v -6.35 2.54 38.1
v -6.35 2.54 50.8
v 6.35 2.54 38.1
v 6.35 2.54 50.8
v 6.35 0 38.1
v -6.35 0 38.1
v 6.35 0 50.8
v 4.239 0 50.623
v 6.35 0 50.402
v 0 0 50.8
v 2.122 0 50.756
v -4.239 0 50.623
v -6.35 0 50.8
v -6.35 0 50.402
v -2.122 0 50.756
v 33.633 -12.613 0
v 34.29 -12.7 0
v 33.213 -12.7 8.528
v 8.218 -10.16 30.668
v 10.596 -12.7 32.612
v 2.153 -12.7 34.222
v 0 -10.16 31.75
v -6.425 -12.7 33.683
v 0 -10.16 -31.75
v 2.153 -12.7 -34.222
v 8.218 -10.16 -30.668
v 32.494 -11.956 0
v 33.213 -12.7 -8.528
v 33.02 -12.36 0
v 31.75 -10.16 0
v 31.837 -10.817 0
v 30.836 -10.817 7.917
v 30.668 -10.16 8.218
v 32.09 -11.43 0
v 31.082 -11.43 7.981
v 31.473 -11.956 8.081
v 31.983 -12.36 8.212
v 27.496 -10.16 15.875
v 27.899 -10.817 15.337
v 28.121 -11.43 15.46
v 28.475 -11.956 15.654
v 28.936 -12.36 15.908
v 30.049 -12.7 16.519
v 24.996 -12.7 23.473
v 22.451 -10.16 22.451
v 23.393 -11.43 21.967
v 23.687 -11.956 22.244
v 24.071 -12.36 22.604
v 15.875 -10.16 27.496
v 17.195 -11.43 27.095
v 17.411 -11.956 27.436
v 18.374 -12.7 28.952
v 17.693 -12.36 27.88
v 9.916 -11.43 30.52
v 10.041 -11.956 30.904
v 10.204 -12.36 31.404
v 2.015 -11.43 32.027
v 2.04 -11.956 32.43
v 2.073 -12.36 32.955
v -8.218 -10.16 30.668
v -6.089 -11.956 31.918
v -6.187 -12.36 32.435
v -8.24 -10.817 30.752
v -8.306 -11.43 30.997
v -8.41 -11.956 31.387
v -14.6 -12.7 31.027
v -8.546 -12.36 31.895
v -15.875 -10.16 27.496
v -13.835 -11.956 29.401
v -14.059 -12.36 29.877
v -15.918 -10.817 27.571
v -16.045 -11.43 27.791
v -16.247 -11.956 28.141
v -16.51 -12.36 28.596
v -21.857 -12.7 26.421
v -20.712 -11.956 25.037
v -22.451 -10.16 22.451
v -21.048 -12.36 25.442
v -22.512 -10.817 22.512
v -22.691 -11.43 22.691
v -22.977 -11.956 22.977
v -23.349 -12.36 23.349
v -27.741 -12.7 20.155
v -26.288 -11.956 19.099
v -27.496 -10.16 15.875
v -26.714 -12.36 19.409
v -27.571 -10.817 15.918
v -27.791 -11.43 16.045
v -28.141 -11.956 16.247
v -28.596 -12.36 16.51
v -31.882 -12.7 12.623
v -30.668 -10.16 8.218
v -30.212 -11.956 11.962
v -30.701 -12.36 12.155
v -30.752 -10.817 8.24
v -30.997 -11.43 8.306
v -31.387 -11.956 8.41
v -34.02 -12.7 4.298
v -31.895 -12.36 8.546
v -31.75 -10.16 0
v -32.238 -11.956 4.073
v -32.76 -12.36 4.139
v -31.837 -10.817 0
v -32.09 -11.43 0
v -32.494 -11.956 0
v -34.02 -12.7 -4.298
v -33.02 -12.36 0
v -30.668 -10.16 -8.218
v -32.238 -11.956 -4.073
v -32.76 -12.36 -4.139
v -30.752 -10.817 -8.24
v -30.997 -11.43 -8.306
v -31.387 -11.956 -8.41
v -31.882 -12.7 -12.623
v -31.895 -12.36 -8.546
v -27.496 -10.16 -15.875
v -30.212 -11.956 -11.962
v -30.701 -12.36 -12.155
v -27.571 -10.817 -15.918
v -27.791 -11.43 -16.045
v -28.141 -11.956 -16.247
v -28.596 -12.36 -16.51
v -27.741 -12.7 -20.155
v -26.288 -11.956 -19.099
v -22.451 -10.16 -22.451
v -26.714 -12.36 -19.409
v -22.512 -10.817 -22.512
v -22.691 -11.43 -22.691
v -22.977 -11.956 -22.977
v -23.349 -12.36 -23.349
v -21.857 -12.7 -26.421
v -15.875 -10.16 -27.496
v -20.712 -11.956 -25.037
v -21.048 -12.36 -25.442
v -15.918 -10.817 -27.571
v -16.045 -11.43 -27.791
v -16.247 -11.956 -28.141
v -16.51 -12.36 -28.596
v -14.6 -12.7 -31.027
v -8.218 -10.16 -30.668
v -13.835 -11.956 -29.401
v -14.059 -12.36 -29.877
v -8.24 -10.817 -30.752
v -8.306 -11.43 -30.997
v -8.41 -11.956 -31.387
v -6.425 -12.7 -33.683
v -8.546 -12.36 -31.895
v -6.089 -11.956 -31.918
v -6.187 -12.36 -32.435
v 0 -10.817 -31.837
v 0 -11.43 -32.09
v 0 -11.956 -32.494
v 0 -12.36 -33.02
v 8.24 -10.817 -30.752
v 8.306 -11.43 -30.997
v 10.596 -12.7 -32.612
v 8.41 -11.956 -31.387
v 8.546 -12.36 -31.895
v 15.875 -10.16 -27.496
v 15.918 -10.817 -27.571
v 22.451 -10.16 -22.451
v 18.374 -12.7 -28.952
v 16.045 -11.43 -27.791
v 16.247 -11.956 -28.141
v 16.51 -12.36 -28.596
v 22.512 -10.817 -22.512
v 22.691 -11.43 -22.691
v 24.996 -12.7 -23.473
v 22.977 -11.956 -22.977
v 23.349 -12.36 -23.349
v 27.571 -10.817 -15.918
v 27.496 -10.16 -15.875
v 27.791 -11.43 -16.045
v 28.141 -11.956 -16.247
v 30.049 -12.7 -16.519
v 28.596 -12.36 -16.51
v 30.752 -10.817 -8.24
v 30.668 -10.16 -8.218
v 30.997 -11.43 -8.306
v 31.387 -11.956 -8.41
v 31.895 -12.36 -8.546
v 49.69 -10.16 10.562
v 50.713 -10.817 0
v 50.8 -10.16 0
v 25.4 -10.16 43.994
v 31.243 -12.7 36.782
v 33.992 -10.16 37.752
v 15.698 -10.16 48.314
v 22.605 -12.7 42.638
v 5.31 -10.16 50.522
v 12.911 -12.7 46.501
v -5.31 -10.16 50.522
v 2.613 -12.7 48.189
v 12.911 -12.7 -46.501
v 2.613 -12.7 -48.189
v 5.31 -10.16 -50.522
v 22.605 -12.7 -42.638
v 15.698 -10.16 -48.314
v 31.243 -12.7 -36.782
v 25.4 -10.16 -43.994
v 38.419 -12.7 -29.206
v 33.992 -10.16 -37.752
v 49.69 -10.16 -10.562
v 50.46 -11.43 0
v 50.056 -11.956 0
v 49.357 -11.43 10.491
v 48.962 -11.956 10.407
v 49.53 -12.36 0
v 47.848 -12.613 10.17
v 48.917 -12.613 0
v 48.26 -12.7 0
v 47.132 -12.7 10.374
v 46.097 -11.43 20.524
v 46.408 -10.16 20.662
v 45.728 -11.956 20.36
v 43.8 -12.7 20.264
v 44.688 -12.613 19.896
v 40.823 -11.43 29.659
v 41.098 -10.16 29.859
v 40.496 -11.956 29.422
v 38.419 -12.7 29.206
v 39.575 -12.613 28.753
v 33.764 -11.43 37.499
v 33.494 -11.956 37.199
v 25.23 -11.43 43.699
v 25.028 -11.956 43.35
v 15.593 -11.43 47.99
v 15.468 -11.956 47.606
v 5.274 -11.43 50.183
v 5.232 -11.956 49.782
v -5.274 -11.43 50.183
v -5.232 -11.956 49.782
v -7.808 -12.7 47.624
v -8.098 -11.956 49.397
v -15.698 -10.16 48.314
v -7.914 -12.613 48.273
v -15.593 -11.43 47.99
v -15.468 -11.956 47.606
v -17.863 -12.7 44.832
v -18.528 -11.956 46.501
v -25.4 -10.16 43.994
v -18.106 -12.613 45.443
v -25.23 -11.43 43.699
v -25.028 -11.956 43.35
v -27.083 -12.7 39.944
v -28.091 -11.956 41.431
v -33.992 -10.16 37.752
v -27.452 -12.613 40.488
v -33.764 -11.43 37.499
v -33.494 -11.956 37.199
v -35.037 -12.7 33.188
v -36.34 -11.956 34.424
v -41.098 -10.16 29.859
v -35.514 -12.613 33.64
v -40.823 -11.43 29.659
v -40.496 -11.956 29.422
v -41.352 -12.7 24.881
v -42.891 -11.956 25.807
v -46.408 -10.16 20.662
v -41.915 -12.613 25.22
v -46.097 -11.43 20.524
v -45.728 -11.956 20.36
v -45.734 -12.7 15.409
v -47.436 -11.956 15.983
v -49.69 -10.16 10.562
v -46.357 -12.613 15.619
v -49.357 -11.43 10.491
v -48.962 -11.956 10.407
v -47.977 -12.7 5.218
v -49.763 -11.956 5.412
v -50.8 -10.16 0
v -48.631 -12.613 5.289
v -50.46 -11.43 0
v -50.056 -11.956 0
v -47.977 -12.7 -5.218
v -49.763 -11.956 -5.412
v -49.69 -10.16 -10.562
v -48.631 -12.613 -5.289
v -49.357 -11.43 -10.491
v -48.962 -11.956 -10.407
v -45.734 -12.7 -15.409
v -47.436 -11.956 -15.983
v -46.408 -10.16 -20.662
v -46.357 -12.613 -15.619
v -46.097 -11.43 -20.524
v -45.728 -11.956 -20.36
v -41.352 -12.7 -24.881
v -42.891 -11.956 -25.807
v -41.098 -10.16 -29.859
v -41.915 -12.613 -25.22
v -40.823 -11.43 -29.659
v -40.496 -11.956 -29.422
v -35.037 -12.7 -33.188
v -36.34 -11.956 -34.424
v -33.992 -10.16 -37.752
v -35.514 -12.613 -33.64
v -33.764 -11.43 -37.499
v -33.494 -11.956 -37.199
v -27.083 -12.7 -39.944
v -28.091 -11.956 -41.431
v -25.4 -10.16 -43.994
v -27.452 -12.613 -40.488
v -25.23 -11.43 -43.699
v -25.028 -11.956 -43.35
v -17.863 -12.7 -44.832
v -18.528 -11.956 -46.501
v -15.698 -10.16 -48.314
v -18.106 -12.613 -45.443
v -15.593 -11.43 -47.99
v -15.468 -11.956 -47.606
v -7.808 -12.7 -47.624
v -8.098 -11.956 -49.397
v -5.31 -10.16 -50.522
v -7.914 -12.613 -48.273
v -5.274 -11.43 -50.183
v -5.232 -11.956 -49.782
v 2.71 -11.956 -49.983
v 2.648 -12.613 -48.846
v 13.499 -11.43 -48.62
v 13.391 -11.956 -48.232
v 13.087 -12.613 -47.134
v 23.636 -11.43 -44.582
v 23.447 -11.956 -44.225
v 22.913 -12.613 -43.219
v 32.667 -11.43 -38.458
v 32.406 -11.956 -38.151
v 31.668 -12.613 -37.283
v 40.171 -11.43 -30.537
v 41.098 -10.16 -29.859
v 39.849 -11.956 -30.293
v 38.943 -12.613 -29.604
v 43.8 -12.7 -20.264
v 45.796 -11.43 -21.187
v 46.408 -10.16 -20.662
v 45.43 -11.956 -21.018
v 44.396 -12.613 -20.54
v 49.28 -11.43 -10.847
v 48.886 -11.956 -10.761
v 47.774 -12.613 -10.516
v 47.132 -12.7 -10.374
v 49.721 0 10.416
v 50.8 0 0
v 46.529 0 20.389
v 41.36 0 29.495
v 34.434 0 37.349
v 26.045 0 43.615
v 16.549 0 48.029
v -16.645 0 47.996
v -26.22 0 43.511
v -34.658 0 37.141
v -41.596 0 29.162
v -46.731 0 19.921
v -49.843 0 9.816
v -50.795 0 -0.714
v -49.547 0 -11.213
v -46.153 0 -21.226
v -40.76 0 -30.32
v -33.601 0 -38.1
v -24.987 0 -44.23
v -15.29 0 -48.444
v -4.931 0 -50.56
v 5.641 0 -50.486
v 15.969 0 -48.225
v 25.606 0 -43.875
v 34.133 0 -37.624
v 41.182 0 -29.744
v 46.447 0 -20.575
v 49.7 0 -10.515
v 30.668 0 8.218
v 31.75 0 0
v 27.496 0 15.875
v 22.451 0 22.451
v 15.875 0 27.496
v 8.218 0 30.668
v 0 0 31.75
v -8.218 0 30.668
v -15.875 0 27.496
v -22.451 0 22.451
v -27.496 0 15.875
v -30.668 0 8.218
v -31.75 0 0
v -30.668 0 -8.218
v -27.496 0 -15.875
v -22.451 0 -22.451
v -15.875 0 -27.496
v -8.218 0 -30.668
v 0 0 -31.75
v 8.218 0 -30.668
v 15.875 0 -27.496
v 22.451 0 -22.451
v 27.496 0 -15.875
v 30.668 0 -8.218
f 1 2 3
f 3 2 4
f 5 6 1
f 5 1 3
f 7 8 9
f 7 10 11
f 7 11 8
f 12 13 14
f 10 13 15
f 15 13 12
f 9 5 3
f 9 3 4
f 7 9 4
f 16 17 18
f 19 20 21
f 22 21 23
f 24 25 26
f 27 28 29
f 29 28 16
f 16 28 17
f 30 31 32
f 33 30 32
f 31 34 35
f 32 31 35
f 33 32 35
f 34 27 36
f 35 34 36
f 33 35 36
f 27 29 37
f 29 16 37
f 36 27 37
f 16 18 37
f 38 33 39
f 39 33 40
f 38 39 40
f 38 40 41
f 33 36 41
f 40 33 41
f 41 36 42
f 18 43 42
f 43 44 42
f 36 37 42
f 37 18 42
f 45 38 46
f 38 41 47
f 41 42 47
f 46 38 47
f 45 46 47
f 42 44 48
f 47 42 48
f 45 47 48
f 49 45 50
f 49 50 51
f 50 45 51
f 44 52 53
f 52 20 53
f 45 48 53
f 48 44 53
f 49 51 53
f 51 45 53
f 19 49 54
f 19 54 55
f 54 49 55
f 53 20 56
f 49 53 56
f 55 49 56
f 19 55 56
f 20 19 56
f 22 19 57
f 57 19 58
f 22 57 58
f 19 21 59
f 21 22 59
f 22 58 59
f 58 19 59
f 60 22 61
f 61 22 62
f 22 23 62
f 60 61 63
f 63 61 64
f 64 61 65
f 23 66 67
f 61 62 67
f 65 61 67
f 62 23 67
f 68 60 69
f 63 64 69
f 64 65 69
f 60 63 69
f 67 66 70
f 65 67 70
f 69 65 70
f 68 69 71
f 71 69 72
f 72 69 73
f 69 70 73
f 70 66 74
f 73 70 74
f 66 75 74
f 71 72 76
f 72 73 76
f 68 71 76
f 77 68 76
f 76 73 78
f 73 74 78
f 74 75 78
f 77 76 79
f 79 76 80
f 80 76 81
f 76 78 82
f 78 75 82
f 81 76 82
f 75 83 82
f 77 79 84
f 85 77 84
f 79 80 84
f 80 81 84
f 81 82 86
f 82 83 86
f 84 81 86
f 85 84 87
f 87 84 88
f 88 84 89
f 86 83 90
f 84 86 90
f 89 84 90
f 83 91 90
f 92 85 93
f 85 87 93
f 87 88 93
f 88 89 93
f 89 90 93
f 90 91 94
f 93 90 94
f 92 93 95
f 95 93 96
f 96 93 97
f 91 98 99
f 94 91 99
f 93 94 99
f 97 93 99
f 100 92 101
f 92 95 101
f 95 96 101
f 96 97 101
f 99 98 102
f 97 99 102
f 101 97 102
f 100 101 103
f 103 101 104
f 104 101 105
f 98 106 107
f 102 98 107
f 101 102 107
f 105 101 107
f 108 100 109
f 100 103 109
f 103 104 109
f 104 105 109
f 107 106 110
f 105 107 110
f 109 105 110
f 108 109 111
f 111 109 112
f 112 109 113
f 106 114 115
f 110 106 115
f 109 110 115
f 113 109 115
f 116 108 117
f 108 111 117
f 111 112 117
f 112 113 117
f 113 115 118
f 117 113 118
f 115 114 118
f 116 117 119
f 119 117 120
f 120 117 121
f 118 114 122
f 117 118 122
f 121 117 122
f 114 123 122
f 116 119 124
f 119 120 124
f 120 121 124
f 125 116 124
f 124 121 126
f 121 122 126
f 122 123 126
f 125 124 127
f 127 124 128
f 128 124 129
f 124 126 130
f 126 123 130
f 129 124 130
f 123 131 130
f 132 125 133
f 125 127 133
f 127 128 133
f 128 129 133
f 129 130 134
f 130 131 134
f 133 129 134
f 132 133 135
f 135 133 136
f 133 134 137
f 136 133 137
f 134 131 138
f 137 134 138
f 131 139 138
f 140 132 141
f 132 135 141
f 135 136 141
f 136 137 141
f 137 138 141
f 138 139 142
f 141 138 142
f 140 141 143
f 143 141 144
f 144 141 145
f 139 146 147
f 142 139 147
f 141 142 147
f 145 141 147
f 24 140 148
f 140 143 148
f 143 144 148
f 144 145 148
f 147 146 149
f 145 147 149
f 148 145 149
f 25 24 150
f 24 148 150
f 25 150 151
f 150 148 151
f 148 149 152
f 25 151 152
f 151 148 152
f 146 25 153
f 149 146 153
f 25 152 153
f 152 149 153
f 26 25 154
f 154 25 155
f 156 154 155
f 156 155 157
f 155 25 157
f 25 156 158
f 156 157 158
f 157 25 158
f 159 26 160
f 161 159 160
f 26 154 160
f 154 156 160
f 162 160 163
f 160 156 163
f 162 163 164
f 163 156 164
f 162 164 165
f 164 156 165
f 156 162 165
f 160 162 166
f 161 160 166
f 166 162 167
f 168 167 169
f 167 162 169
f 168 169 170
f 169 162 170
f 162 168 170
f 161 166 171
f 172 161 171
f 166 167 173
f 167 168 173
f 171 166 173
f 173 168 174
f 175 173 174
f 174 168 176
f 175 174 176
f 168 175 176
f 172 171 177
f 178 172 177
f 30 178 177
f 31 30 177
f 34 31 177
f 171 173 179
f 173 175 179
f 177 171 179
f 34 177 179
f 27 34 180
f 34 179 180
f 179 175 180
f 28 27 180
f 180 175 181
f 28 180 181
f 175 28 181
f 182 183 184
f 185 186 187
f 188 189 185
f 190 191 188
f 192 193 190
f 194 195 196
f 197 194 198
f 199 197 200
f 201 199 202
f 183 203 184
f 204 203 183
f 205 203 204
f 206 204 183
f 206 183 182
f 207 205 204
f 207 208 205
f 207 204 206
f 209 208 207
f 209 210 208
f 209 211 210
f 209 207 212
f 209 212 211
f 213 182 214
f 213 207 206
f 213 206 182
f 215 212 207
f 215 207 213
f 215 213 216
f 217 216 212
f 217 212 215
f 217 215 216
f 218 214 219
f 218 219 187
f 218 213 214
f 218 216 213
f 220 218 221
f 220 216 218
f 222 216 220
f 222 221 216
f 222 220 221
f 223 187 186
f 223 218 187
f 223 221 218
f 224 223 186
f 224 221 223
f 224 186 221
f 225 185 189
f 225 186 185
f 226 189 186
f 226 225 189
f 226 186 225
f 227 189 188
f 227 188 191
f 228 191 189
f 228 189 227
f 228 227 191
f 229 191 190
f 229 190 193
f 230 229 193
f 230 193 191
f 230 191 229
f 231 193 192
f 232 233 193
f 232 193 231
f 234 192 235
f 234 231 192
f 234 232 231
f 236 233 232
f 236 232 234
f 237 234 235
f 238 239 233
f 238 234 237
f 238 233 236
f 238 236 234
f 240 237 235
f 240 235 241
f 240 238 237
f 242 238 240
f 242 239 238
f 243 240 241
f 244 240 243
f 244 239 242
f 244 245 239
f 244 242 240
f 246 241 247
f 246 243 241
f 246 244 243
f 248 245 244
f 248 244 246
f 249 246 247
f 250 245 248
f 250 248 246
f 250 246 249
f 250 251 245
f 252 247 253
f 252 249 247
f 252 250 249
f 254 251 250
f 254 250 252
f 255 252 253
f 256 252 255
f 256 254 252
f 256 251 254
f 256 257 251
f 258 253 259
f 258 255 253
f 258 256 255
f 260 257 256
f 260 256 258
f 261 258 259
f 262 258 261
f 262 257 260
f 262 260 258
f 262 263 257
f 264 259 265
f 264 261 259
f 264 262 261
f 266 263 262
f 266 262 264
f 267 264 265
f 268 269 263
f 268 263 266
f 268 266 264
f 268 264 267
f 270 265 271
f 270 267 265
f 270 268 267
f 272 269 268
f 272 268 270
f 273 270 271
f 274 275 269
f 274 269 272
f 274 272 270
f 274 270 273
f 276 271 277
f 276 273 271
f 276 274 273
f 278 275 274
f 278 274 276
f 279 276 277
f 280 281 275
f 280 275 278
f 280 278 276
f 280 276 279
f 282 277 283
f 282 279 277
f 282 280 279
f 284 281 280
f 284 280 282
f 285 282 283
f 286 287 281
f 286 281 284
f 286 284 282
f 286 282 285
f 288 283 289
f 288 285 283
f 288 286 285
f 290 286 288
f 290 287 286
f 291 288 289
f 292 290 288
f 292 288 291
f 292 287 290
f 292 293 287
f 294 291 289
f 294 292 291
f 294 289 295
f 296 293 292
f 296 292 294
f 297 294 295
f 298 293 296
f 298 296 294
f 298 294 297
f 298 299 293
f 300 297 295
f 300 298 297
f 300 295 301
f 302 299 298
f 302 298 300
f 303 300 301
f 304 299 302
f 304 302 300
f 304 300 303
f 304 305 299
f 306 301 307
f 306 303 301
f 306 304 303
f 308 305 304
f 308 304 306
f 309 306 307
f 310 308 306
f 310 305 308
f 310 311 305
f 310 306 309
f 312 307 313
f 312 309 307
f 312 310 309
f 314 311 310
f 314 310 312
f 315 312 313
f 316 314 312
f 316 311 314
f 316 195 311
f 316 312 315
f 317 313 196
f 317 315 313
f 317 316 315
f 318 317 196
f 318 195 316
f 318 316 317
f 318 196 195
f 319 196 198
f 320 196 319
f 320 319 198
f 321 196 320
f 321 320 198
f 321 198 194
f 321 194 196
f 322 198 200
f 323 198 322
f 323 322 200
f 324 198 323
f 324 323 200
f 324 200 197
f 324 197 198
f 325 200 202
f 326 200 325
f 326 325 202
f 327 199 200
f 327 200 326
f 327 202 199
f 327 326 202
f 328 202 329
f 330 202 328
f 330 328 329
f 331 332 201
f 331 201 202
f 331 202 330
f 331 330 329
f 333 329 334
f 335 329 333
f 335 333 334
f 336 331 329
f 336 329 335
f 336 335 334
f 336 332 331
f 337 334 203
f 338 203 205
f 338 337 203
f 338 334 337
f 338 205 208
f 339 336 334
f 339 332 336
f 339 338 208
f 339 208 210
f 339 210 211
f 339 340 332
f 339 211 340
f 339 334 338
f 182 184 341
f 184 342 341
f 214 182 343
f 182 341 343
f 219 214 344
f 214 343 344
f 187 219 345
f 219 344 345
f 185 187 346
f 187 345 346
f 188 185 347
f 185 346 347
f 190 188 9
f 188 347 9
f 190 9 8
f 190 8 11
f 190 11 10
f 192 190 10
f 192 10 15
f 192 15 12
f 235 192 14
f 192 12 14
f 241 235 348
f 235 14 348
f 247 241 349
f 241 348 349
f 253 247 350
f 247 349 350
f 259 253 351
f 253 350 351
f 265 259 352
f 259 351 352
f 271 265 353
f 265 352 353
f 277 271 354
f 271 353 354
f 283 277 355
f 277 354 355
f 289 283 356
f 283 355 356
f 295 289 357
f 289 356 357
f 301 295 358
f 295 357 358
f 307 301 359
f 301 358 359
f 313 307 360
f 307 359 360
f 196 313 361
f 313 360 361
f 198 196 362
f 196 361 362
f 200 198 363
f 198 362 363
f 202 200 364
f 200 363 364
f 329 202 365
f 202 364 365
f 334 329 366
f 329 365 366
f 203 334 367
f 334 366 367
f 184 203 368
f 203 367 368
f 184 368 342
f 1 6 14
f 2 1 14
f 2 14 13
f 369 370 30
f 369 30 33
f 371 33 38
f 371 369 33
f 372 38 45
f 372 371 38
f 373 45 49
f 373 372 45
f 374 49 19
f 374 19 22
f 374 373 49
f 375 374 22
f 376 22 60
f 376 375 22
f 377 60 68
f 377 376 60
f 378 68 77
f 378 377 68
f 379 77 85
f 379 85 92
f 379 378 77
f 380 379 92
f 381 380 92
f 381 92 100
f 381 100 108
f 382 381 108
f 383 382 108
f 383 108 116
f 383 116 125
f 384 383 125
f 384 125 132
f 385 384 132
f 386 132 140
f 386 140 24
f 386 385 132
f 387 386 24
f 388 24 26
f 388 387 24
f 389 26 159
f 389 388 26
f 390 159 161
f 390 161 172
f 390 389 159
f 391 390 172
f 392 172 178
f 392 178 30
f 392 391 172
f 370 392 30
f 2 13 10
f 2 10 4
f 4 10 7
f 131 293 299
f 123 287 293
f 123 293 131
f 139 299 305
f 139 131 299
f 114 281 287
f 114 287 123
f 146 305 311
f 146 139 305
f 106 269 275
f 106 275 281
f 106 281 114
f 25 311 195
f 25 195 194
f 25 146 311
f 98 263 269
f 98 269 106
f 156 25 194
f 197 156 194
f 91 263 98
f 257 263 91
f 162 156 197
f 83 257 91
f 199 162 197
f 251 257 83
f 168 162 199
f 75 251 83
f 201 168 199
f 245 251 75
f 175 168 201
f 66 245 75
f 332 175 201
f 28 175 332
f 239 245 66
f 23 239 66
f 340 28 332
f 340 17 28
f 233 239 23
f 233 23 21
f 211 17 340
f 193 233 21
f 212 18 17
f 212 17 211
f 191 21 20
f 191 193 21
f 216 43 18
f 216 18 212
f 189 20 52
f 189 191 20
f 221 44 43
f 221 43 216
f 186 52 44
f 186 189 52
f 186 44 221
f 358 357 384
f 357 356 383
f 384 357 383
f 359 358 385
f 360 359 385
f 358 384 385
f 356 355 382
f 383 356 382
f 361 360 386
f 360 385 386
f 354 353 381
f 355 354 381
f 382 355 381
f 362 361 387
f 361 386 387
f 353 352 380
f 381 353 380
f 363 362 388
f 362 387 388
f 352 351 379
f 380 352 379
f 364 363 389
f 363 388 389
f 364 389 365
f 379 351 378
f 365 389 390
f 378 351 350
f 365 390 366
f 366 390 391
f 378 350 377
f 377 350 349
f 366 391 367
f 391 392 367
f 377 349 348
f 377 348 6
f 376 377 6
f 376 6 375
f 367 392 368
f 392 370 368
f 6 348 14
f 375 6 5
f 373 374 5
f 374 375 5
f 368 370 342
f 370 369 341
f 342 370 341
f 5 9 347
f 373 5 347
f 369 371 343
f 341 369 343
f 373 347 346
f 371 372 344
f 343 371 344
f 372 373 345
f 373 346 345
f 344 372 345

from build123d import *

# Parameters (mm, degrees)
F0_R     = 50.8
F0_R_2   = 31.75
F1_DEPTH = 12.7
F2_R     = 2.54
F3_W     = 12.7
F3_H     = 12.7
F4_DEPTH = 2.54


with BuildPart() as f1:
    # F0 (on Front) → F1 (new body)
    with BuildSketch(Plane.XZ):
        Circle(F0_R)
        Circle(F0_R_2, mode=Mode.SUBTRACT)
    extrude(amount=F1_DEPTH)

    # F2
    f2_edges = [f1.edges().sort_by_distance(p)[0] for p in [
        (-50.8, -12.7, 0),
        (-31.75, -12.7, 0),
    ]]
    fillet(f2_edges, radius=F2_R)

    # F3 (on Front) → F4 (join)
    with BuildSketch(Plane.XZ):
        with Locations((0, 44.45)):
            Rectangle(F3_W, F3_H)
    extrude(amount=-F4_DEPTH)


solid = f1.part
